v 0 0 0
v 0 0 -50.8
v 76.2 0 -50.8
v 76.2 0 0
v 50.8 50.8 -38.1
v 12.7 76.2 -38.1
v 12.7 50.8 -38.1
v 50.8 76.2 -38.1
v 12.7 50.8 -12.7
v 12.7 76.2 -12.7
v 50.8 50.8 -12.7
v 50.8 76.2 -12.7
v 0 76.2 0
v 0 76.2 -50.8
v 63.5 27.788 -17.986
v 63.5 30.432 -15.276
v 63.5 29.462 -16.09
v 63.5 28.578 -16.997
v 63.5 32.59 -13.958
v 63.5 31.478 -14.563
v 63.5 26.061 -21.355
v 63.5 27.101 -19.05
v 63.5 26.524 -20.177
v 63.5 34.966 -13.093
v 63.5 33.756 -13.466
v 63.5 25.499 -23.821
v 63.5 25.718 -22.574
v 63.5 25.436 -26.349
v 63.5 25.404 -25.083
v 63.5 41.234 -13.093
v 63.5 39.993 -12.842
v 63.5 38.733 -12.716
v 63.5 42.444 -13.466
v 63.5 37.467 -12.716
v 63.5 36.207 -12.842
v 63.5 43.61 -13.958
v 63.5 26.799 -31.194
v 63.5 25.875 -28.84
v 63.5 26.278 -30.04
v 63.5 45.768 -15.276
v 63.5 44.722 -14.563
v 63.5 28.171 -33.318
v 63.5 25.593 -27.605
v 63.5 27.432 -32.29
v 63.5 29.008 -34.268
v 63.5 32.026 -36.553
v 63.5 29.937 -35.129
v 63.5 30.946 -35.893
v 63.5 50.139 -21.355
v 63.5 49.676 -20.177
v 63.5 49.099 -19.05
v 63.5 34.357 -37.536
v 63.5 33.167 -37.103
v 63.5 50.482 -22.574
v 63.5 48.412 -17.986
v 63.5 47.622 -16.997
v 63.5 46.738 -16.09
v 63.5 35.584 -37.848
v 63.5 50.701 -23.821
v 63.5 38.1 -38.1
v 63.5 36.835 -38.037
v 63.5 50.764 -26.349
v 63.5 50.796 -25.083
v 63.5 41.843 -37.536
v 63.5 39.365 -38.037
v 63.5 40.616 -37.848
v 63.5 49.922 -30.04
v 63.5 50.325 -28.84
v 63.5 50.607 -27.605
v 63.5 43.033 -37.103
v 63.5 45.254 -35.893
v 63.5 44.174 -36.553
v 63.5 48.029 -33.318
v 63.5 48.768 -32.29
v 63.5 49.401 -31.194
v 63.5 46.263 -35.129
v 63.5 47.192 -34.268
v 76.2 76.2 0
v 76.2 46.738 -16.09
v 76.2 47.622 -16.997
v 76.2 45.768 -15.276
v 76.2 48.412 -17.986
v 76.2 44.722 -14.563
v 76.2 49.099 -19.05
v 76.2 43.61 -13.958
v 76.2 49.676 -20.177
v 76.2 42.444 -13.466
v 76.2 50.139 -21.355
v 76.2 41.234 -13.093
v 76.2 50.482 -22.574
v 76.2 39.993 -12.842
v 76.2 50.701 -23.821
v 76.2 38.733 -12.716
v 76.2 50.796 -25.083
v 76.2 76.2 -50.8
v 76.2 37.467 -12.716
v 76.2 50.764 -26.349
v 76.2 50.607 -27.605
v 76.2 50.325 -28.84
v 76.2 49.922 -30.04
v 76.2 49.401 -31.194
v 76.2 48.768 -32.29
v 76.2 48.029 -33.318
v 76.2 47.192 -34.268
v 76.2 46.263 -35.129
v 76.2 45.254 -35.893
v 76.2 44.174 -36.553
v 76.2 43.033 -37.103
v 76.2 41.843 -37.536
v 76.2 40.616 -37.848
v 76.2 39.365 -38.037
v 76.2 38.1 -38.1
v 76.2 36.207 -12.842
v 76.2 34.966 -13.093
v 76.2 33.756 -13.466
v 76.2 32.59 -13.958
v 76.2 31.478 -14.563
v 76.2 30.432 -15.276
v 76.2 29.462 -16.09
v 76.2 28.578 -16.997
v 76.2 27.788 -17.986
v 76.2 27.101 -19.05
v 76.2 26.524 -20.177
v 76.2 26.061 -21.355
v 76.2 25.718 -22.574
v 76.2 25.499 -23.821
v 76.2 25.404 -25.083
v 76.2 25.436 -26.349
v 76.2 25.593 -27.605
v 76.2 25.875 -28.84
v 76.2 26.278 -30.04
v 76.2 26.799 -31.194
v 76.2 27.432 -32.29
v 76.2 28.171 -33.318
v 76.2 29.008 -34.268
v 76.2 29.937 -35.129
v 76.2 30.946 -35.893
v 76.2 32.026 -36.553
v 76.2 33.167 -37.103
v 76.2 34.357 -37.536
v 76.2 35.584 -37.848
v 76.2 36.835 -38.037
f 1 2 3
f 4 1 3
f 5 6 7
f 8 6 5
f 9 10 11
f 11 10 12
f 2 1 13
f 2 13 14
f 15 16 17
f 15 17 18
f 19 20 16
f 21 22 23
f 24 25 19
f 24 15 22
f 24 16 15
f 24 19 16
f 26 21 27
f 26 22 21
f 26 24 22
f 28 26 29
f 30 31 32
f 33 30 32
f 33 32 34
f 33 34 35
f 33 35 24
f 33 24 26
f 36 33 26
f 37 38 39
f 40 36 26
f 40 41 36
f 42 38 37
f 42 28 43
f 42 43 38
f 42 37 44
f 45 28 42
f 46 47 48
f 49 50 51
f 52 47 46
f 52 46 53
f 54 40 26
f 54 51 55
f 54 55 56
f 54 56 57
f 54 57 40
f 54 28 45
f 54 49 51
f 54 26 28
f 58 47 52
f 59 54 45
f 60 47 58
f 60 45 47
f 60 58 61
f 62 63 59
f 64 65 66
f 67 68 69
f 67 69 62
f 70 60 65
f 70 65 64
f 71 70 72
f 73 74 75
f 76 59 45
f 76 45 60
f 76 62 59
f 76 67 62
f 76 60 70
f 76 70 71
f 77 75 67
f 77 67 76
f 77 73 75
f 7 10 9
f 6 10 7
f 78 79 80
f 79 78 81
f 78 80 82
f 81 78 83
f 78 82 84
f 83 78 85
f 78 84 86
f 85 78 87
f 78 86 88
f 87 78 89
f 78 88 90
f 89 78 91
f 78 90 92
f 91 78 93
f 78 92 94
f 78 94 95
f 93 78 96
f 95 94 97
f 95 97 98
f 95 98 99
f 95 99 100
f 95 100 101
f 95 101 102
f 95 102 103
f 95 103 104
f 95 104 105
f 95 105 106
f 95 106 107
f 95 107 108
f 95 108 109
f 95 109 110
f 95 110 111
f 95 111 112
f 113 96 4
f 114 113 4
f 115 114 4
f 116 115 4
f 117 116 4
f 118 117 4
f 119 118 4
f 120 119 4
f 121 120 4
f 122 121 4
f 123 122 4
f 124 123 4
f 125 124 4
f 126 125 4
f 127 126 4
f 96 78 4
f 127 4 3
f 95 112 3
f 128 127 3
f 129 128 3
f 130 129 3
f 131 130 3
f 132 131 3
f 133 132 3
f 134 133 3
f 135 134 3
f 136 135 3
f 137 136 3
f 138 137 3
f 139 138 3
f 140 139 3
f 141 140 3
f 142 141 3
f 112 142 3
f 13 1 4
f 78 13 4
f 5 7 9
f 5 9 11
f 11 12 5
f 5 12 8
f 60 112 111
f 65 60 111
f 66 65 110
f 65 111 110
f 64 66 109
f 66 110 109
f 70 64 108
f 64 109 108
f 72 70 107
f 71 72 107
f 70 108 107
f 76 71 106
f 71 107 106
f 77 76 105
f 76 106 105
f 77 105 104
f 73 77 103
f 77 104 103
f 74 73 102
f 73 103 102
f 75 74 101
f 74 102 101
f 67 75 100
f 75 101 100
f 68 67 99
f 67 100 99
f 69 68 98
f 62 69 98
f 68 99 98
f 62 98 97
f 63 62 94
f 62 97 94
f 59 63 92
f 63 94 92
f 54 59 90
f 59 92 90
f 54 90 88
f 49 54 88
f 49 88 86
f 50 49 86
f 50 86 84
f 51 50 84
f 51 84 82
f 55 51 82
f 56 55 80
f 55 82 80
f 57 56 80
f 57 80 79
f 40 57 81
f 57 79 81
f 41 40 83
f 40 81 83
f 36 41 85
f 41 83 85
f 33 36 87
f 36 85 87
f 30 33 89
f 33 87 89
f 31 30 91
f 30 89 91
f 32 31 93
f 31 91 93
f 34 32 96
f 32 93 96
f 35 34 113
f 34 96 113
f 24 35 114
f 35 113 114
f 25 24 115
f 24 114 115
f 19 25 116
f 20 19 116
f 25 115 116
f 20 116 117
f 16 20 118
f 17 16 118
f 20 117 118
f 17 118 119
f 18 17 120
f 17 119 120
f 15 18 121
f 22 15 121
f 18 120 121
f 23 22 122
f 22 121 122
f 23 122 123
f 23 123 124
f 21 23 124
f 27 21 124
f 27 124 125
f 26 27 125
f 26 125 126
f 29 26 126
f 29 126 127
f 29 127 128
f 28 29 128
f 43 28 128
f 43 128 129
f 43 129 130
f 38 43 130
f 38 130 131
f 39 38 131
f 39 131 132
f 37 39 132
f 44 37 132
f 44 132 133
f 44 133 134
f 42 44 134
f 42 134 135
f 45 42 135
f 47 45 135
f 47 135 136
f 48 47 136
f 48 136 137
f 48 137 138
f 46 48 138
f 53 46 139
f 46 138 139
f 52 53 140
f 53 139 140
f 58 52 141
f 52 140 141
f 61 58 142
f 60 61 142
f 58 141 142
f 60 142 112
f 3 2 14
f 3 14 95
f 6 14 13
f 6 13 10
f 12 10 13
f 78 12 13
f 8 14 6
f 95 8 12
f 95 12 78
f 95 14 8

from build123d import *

# Parameters (mm, degrees)
SKETCH1_W           = 76.2
SKETCH1_H           = 50.8
BOSS_EXTRUDE1_DEPTH = 76.2
SKETCH2_W           = 38.1
SKETCH2_H           = 25.4
CUT_EXTRUDE1_DEPTH  = 25.4
SKETCH3_R           = 12.7
CUT_EXTRUDE3_DEPTH  = 12.7


with BuildPart() as part:
    # Sketch1 → Boss-Extrude1 (new body)
    with BuildSketch(Plane(origin=(0, 0, 0), x_dir=(1, 0, 0), z_dir=(0, 1, 0))):
        with Locations((38.1, 25.4)):
            Rectangle(SKETCH1_W, SKETCH1_H)
    extrude(amount=BOSS_EXTRUDE1_DEPTH)

    # Sketch2 → Cut-Extrude1 (cut)
    with BuildSketch(Plane(origin=(0, 76.2, 0), x_dir=(1, 0, 0), z_dir=(0, 1, 0))):
        with Locations((31.75, 25.4)):
            Rectangle(SKETCH2_W, SKETCH2_H)
    extrude(amount=-CUT_EXTRUDE1_DEPTH, mode=Mode.SUBTRACT)

    # Sketch3 → Cut-Extrude3 (cut)
    with BuildSketch(Plane(origin=(76.2, 0, 0), x_dir=(0, 0, -1), z_dir=(1, 0, 0))):
        with Locations((25.4, 38.1)):
            Circle(SKETCH3_R)
    extrude(amount=-CUT_EXTRUDE3_DEPTH, mode=Mode.SUBTRACT)


solid = part.part
